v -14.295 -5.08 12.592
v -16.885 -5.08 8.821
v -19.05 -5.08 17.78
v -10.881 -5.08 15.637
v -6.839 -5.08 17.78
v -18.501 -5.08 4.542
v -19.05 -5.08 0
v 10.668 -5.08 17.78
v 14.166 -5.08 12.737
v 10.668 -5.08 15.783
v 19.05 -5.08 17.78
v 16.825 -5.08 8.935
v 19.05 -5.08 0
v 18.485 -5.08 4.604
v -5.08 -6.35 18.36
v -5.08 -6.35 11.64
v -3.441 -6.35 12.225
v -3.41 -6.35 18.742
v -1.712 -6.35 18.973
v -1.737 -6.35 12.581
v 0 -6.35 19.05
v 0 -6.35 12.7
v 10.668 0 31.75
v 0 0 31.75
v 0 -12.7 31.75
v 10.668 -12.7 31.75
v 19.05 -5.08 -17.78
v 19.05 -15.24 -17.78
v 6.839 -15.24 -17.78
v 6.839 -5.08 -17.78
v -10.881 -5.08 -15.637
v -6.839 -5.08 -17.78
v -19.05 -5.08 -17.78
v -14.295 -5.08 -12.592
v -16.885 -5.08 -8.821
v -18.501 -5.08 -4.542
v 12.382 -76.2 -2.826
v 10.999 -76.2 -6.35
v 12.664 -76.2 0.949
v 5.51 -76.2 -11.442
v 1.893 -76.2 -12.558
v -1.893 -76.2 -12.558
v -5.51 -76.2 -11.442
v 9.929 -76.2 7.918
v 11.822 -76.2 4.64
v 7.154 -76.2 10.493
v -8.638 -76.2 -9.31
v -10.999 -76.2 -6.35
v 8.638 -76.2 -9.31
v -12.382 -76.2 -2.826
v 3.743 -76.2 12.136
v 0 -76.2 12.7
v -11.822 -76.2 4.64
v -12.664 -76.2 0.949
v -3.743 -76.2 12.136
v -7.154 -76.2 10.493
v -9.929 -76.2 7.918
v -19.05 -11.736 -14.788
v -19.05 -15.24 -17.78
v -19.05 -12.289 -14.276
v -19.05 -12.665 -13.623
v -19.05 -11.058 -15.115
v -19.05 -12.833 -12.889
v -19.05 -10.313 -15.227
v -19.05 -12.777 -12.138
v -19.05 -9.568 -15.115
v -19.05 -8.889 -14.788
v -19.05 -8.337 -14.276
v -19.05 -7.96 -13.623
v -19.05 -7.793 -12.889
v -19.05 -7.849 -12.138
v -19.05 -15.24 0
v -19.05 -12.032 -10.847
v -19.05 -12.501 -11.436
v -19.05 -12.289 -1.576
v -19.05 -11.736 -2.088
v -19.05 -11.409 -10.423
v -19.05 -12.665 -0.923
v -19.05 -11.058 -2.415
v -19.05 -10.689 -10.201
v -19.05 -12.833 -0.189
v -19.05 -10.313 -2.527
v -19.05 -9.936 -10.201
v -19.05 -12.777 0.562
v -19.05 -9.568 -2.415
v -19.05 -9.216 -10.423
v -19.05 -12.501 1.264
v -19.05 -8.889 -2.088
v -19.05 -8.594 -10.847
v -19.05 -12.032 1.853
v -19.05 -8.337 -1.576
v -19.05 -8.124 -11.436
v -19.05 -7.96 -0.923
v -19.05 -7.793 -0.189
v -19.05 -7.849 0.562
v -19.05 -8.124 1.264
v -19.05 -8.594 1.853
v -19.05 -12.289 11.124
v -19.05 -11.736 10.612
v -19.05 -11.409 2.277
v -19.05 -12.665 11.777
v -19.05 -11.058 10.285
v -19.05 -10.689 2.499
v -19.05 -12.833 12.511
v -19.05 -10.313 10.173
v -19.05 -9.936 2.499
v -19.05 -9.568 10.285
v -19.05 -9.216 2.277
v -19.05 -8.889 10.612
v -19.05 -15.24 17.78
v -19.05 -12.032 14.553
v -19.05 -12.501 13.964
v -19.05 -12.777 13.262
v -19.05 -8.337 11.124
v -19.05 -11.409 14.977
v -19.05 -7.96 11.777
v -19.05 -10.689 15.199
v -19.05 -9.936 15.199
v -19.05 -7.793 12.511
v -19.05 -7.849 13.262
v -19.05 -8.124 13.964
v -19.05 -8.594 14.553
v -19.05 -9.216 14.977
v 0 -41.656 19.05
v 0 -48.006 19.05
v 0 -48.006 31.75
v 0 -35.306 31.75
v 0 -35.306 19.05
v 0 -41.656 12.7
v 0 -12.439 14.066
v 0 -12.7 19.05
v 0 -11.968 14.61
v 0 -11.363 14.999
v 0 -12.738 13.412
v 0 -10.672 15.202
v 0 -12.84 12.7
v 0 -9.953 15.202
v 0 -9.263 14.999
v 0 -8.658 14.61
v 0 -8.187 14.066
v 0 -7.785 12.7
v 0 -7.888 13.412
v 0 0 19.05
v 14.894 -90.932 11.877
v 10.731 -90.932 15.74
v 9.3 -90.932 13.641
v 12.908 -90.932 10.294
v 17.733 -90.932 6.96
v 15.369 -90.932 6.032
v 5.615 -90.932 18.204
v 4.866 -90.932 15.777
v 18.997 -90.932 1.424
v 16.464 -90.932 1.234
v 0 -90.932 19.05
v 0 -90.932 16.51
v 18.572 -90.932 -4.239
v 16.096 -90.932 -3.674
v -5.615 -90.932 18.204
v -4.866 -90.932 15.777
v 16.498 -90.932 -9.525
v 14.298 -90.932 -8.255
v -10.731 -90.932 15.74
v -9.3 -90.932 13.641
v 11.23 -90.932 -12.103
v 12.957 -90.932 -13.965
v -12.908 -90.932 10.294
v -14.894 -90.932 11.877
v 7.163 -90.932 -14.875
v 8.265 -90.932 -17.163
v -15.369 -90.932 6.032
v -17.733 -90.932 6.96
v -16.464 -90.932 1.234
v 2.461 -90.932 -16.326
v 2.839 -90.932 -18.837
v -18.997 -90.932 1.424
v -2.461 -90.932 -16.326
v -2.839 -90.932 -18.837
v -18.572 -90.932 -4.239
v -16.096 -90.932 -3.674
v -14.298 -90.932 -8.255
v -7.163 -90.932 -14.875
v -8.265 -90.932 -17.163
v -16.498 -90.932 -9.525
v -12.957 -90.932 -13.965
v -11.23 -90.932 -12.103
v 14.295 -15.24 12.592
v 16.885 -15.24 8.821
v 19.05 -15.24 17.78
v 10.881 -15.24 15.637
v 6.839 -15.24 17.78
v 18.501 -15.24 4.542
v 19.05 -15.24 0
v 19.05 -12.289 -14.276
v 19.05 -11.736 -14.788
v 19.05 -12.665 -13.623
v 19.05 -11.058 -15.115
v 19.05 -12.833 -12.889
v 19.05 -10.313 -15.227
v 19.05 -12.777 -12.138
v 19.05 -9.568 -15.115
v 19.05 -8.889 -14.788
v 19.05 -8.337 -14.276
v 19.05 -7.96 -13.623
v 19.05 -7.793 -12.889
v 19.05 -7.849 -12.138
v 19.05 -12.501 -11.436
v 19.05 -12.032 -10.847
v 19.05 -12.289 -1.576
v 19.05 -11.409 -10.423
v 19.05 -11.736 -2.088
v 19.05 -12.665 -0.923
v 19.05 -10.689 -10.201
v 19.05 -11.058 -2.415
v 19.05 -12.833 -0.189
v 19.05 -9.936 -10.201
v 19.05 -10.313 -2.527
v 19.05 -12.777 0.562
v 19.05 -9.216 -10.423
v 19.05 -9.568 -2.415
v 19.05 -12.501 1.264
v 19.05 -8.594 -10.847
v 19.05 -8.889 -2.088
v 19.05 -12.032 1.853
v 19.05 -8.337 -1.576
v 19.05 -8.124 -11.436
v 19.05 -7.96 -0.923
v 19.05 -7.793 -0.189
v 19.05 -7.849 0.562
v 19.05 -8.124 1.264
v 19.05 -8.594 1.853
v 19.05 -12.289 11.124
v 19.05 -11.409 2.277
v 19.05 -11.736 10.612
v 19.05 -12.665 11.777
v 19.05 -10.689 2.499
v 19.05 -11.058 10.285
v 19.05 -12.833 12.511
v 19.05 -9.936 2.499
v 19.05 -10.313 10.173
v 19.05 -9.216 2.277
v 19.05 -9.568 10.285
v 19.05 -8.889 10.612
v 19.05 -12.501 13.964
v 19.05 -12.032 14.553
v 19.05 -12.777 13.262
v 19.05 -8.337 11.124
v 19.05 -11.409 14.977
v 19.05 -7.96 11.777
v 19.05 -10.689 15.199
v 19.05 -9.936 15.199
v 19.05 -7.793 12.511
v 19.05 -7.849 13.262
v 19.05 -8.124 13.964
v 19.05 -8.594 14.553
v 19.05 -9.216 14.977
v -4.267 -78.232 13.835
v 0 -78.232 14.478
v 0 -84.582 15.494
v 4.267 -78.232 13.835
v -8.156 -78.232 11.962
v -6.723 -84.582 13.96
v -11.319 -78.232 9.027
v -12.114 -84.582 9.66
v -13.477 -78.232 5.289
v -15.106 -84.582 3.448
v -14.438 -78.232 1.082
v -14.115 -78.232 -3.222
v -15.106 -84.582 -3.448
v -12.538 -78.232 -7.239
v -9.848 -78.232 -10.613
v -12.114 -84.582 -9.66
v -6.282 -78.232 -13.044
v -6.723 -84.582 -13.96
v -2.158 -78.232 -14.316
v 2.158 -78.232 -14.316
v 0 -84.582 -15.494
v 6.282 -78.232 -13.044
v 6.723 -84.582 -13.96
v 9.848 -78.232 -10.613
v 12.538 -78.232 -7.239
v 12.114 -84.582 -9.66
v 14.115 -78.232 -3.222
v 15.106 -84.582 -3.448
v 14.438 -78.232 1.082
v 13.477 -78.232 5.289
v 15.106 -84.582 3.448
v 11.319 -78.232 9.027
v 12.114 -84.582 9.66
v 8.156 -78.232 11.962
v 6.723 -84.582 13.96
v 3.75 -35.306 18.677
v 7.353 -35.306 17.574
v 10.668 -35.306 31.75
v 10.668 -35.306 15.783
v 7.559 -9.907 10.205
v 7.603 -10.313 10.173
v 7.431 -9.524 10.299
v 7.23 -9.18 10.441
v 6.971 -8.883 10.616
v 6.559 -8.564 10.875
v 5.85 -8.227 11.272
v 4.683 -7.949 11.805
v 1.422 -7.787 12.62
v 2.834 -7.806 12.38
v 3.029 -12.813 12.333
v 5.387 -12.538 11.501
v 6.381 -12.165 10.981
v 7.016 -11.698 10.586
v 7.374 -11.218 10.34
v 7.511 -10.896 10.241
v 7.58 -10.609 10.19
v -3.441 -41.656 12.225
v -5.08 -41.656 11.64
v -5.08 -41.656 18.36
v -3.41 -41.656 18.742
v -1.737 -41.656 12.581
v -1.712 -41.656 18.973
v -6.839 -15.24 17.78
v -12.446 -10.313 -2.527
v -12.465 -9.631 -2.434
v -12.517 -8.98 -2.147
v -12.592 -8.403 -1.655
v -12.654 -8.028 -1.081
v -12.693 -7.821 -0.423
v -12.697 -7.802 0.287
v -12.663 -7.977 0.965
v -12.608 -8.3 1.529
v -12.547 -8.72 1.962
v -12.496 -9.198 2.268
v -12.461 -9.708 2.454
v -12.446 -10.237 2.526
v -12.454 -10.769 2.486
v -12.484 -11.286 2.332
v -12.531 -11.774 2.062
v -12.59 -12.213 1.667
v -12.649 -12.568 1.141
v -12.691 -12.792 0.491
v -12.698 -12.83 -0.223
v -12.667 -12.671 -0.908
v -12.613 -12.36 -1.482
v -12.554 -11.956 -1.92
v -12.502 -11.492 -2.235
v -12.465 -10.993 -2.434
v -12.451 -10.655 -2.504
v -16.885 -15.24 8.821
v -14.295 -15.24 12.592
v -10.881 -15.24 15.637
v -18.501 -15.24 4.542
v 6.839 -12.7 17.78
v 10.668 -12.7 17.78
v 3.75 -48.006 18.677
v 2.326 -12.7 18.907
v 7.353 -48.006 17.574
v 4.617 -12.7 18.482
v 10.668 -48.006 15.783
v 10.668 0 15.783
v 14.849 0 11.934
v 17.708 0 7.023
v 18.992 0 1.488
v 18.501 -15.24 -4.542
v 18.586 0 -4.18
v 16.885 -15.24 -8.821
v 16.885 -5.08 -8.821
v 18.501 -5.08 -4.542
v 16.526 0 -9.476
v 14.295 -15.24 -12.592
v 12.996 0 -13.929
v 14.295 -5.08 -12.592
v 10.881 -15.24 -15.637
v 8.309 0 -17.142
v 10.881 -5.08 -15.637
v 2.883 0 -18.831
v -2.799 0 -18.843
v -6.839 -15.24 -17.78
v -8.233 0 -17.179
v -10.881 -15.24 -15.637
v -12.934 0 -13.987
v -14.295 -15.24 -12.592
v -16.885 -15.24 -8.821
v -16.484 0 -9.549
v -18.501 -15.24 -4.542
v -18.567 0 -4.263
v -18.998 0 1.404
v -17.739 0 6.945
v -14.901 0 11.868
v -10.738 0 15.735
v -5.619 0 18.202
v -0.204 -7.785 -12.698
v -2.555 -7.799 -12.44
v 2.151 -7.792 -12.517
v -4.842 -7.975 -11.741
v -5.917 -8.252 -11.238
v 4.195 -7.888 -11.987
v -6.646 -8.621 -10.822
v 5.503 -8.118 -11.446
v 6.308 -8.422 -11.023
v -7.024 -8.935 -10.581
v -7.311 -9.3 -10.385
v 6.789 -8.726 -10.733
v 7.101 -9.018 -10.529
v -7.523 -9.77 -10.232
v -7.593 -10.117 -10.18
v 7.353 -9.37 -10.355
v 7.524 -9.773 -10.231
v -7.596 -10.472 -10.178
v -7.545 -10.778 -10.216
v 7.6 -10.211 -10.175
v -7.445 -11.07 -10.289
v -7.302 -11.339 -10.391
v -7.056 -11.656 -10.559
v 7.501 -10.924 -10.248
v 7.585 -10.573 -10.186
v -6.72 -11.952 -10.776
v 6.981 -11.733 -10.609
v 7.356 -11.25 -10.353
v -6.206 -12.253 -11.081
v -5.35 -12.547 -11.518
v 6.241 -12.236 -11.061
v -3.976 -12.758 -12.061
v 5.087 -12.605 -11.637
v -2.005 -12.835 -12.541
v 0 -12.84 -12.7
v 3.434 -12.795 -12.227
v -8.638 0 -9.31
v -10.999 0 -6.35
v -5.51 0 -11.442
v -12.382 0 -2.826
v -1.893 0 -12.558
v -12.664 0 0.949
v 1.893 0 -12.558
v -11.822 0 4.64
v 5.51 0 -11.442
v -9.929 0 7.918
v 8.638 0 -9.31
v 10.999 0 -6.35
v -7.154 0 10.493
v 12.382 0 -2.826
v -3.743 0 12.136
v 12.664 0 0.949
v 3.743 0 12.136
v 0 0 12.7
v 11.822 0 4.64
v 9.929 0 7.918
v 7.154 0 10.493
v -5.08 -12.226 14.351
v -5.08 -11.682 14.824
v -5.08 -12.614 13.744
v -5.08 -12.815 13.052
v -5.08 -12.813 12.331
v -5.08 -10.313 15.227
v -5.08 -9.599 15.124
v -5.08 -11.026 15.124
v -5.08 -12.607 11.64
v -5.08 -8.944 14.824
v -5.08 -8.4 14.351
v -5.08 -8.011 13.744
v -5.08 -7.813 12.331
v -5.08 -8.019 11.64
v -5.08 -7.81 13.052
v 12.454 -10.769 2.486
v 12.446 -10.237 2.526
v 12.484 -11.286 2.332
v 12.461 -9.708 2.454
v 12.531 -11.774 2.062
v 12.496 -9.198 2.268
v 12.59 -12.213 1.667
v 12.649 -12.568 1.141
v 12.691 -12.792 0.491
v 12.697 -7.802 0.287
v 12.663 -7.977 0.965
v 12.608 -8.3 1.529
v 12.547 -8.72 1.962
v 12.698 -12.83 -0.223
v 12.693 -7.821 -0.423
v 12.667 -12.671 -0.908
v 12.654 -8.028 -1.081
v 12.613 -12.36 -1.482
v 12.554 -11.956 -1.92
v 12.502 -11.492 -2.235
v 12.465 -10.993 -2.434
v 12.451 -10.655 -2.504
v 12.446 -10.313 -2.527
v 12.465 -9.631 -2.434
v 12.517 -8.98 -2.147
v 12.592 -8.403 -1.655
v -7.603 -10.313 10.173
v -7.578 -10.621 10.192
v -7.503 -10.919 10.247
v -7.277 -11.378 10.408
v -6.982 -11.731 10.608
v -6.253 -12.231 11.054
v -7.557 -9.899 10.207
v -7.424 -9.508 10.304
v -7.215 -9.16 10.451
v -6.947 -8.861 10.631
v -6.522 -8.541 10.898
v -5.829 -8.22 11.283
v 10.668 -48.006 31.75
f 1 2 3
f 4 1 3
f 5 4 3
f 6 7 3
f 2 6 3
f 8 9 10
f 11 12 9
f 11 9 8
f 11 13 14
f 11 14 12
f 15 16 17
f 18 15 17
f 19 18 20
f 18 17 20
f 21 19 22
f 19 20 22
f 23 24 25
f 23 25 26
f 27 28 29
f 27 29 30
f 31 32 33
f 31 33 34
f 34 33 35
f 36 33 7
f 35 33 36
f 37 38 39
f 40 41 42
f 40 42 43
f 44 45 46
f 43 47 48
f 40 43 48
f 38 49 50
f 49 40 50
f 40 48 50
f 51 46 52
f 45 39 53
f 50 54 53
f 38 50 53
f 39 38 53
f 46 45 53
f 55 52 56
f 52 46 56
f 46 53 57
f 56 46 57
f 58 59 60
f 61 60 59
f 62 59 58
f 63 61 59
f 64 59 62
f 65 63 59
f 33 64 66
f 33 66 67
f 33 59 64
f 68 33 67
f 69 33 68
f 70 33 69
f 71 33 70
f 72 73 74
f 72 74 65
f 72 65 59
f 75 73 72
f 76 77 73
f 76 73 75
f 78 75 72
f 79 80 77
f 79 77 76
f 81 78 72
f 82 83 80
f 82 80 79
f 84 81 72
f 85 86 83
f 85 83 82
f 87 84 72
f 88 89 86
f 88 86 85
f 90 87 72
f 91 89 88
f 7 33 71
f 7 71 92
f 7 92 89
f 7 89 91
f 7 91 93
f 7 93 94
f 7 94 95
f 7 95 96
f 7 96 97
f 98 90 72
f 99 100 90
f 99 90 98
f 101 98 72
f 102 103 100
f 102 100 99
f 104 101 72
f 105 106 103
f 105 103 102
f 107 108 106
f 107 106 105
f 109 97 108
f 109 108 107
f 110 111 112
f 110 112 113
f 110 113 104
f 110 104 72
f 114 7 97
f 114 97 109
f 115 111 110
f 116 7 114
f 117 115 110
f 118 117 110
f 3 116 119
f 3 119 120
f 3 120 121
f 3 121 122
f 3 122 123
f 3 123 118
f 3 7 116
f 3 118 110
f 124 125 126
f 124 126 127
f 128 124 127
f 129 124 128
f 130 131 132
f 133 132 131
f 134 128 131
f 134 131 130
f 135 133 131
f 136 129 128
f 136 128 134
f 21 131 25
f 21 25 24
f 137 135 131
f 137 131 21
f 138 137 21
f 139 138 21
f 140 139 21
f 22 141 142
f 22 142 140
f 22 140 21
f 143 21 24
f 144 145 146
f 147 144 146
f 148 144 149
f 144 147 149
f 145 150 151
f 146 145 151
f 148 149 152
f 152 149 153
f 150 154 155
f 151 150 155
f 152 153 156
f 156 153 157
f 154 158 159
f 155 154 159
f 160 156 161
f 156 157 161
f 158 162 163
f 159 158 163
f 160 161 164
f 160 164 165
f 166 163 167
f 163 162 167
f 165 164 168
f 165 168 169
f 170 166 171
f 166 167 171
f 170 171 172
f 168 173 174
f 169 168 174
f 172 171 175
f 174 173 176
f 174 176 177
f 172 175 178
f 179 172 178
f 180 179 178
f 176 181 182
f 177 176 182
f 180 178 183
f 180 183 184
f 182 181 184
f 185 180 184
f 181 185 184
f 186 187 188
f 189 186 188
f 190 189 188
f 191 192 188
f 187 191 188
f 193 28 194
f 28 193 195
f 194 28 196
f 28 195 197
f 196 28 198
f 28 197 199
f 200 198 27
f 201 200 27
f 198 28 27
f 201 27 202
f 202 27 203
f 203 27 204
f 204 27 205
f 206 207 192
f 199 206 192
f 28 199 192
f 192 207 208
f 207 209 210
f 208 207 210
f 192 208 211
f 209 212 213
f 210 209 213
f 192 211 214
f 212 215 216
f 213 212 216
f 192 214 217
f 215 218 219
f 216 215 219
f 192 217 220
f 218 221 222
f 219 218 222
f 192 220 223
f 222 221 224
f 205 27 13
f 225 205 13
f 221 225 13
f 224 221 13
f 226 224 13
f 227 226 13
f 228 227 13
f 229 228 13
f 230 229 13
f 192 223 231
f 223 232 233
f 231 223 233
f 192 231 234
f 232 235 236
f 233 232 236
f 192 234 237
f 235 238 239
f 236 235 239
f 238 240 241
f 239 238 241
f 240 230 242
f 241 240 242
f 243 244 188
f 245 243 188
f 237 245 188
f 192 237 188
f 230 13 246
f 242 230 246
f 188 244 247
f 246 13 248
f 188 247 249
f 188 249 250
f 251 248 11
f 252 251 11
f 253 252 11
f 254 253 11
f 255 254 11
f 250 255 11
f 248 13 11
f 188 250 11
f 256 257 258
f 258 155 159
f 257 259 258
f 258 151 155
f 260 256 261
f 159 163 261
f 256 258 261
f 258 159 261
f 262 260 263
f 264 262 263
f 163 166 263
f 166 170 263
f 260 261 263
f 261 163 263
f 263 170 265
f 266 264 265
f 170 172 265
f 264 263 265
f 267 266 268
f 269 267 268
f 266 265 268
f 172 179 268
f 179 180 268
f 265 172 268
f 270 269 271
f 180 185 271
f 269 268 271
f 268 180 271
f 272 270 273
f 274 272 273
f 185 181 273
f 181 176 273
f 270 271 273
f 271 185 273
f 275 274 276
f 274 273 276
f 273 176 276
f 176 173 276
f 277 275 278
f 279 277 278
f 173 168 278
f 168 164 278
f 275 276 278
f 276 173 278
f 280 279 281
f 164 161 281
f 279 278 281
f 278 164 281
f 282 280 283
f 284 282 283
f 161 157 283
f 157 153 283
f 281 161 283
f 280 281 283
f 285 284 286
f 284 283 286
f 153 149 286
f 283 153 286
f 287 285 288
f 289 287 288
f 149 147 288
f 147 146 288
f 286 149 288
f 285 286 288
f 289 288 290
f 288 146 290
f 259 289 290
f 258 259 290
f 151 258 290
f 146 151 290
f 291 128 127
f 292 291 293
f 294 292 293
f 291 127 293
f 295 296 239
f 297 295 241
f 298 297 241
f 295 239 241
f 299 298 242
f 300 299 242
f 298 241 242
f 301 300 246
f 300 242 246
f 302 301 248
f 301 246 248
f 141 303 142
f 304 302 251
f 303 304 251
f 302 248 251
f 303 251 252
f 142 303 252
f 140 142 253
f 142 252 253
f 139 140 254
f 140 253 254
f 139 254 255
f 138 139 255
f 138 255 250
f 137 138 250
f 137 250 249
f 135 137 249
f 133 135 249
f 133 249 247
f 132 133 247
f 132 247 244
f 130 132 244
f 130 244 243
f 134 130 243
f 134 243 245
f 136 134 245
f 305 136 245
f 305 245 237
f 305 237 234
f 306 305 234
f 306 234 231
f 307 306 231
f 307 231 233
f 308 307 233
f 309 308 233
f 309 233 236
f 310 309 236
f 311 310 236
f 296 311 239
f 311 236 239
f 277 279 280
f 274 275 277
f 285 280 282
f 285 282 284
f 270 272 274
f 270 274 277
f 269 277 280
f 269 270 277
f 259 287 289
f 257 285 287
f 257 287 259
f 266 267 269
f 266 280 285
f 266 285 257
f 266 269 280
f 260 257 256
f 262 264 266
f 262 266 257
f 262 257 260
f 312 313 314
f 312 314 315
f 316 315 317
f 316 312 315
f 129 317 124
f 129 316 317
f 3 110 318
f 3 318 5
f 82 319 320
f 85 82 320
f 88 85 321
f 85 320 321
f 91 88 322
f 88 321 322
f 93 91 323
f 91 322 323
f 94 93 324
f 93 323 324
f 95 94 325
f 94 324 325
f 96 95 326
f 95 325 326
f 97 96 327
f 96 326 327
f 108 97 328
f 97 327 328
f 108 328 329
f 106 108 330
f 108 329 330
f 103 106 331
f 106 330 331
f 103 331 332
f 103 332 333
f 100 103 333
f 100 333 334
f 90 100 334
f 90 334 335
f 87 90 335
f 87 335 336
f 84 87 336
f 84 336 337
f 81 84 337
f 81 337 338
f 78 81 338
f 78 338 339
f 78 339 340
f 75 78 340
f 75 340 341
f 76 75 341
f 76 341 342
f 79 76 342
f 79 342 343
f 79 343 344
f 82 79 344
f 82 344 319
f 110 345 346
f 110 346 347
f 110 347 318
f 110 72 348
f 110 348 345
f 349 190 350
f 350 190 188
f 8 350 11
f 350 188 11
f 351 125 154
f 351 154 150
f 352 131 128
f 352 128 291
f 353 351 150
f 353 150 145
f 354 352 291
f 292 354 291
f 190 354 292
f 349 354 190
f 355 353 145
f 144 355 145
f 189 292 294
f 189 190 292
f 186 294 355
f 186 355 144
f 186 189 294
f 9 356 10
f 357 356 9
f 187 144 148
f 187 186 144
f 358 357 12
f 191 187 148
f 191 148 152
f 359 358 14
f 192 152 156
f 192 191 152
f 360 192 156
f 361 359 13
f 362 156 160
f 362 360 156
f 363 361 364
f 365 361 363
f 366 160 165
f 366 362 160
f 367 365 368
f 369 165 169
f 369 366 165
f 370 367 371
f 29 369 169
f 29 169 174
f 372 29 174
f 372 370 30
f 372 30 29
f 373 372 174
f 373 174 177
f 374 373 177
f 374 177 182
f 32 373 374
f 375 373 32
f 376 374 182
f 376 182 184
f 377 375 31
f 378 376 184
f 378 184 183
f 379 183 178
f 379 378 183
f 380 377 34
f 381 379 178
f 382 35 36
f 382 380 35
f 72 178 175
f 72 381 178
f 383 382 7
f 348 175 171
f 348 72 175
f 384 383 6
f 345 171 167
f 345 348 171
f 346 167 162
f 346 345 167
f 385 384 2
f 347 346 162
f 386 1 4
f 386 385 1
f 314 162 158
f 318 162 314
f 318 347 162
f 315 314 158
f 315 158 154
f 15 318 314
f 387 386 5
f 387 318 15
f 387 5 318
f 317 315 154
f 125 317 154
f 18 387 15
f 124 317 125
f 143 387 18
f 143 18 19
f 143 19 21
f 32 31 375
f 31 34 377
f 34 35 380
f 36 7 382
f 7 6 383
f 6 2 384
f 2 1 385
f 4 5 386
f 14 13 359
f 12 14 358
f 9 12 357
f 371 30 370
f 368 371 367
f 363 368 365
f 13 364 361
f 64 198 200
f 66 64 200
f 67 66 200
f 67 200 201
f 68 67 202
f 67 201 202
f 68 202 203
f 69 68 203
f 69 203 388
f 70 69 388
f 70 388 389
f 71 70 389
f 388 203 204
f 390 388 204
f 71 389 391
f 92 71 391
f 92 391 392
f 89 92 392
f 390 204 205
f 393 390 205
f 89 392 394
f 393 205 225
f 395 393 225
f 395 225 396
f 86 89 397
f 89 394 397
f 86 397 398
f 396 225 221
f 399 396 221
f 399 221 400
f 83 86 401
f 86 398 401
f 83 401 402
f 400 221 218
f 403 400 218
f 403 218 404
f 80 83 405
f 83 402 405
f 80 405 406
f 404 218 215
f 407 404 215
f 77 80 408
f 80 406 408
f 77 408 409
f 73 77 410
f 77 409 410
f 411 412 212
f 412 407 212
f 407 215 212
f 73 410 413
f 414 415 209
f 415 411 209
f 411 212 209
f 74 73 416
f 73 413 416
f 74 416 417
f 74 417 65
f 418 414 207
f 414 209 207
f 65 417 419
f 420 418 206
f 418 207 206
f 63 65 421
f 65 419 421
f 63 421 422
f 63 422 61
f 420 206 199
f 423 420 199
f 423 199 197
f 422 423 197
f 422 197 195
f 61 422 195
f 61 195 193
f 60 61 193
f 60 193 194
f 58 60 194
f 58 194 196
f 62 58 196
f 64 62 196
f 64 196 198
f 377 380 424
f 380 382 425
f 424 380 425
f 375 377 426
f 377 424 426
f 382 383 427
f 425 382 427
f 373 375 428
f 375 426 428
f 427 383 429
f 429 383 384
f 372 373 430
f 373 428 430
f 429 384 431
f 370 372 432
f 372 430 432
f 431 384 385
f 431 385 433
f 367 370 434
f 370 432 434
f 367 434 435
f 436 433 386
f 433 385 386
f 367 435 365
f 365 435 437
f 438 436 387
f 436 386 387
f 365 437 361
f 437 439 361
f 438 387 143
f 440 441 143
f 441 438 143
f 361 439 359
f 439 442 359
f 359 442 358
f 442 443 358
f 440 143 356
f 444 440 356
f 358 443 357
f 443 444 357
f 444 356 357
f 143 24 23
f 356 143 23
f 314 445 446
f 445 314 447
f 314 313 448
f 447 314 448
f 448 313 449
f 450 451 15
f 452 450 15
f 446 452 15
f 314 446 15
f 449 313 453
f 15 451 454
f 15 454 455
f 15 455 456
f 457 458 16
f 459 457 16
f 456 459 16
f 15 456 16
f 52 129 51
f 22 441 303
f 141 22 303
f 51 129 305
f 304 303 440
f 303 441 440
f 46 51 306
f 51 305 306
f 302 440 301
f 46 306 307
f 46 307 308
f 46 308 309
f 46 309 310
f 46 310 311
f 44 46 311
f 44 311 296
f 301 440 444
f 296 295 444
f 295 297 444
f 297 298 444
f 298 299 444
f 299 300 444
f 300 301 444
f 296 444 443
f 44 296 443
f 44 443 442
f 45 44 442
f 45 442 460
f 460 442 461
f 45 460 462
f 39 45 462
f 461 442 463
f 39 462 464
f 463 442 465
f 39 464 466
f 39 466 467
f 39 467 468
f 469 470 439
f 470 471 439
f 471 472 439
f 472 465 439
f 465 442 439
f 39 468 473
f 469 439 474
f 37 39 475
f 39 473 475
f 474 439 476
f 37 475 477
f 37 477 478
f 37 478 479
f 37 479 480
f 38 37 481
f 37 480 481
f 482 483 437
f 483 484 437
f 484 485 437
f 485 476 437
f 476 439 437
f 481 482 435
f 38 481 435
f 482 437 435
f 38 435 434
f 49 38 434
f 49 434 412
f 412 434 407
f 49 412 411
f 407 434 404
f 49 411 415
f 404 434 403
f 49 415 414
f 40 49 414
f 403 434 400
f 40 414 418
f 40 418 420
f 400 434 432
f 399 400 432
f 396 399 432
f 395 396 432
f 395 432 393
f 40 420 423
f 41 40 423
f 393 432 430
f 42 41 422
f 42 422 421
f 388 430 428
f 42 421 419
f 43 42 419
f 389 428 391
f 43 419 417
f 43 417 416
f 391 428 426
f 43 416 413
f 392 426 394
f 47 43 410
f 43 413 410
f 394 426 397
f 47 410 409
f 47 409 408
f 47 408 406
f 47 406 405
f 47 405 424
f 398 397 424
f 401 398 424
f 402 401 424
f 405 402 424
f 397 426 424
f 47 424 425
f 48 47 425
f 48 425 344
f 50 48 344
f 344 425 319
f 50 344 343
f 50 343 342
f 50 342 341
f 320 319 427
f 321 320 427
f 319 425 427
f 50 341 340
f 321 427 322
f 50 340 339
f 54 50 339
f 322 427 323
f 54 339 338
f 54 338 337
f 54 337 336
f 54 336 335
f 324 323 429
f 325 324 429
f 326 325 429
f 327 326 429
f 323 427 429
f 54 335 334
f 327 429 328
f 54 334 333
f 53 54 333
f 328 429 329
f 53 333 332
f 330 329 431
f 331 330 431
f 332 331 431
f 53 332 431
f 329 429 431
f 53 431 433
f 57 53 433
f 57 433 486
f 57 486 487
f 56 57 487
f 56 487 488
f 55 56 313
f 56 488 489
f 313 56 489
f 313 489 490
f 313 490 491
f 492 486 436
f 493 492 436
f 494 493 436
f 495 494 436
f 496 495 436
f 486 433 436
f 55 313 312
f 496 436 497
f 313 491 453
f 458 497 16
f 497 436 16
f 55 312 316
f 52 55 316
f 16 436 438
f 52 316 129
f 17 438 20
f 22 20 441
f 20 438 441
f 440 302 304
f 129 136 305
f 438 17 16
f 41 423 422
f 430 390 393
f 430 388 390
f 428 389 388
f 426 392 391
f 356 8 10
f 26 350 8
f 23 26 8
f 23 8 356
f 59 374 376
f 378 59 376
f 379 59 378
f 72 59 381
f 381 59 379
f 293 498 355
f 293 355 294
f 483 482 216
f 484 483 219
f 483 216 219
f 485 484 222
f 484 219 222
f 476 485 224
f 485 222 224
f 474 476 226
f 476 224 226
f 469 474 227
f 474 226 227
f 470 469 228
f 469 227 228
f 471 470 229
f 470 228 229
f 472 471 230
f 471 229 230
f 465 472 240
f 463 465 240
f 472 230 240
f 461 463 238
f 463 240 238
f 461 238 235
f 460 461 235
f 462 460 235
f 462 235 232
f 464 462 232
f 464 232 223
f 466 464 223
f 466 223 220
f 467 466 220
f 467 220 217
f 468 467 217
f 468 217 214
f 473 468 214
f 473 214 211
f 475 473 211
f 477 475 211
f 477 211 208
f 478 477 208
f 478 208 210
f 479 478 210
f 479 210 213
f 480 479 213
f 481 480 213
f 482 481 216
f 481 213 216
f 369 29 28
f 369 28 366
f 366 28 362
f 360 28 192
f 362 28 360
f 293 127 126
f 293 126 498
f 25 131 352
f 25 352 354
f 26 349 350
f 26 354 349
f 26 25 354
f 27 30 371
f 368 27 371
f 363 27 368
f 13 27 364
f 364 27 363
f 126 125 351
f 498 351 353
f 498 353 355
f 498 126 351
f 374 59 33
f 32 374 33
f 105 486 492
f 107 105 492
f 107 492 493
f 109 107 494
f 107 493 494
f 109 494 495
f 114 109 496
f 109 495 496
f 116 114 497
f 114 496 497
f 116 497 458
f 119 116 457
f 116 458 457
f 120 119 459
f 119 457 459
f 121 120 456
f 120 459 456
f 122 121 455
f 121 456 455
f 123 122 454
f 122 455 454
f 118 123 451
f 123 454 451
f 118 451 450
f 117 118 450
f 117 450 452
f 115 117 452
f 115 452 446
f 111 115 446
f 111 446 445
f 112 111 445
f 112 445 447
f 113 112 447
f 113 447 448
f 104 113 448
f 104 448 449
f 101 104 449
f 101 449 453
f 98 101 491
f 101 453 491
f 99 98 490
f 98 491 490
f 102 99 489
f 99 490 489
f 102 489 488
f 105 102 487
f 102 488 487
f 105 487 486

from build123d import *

# Parameters (mm, degrees)
SKETCH1_R                            = 19.05
SKETCH1_R_2                          = 12.7
BOSS_EXTRUDE1_DEPTH                  = 76.2
SKETCH2_W                            = 10.668
SKETCH2_H                            = 12.7
BOSS_EXTRUDE2_DEPTH                  = 12.7
BOSS_EXTRUDE2_DIRECTION_2_REACH      = 89.298
BOSS_EXTRUDE2_DIRECTION_2_END_RADIUS = 19.05
SKETCH3_R                            = 19.05
BOSS_EXTRUDE3_DEPTH                  = 2.032
SKETCH4_W                            = 5.08
SKETCH4_H                            = 35.306
CUT_EXTRUDE1_DEPTH                   = 87.551781172
BOSS_EXTRUDE4_REACH                  = 105.578
BOSS_EXTRUDE4_END_RADIUS             = 19.05
SKETCH7_W                            = 35.56
SKETCH7_H                            = 10.16
F_8_0_199_DIAMETER_HOLE1_D           = 5.0546


with BuildPart() as part:
    # Sketch1 → Boss-Extrude1 (new body)
    with BuildSketch(Plane(origin=(0, 0, 0), x_dir=(1, 0, 0), z_dir=(0, 1, 0))):
        with Locations(Location((0, 0, 0), (0, 0, 270))):
            Circle(SKETCH1_R)
        with Locations(Location((0, 0, 0), (0, 0, 270))):
            Circle(SKETCH1_R_2, mode=Mode.SUBTRACT)
    extrude(amount=-BOSS_EXTRUDE1_DEPTH)

    # Sketch2 → Boss-Extrude2 (add)
    with BuildSketch(Plane.XY.offset(19.05)):
        with Locations((5.334, -6.35)):
            Rectangle(SKETCH2_W, SKETCH2_H)
        with Locations((5.334, -41.656)):
            Rectangle(SKETCH2_W, SKETCH2_H)
    extrude(amount=BOSS_EXTRUDE2_DEPTH)

    # Boss-Extrude2 direction 2: up to this cylinder (the profile starts outside it)
    boss_extrude2_direction_2_end = Plane(origin=(0, -24.003, 0), z_dir=(0, 1, 0)) * Cylinder(BOSS_EXTRUDE2_DIRECTION_2_END_RADIUS, 253.002, mode=Mode.PRIVATE)
    # Sketch2 → Boss-Extrude2 direction 2 (add, up to the surface)
    with BuildSketch(Plane.XY.offset(19.05), mode=Mode.PRIVATE) as boss_extrude2_direction_2_sk1:
        with Locations((5.334, -6.35)):
            Rectangle(SKETCH2_W, SKETCH2_H)
    boss_extrude2_direction_2_tool1 = extrude(boss_extrude2_direction_2_sk1.sketch, amount=-BOSS_EXTRUDE2_DIRECTION_2_REACH, mode=Mode.PRIVATE) - boss_extrude2_direction_2_end
    add(boss_extrude2_direction_2_tool1.solids().sort_by_distance((5.334, -6.35, 19.05))[0])
    # Sketch2 → Boss-Extrude2 direction 2 (add, up to the surface)
    with BuildSketch(Plane.XY.offset(19.05), mode=Mode.PRIVATE) as boss_extrude2_direction_2_sk2:
        with Locations((5.334, -41.656)):
            Rectangle(SKETCH2_W, SKETCH2_H)
    boss_extrude2_direction_2_tool2 = extrude(boss_extrude2_direction_2_sk2.sketch, amount=-BOSS_EXTRUDE2_DIRECTION_2_REACH, mode=Mode.PRIVATE) - boss_extrude2_direction_2_end
    add(boss_extrude2_direction_2_tool2.solids().sort_by_distance((5.334, -41.656, 19.05))[0])

    # Sketch3 → Boss-Extrude3 (add)
    with BuildSketch(Plane.XZ.offset(76.2)):
        with Locations(Location((0, 0, 0), (0, 0, 90))):
            Circle(SKETCH3_R)
    extrude(amount=BOSS_EXTRUDE3_DEPTH)

    # Sketch4 → Cut-Extrude1 (cut, through all)
    with BuildSketch(Plane.XY):
        with Locations((-2.54, -24.003)):
            Rectangle(SKETCH4_W, SKETCH4_H)
    extrude(amount=CUT_EXTRUDE1_DEPTH, mode=Mode.SUBTRACT)

    # Sketch6 → Revolve2 (revolve)
    with BuildSketch(Plane.XY, mode=Mode.PRIVATE) as revolve2_sk:
        Polygon((-14.478, -78.232), (-16.51, -90.932), (-19.05, -90.932), (-19.05, -78.232), align=None)
    revolve(revolve2_sk.sketch.rotate(Axis((0, -78.232, 0), (0, -1, 0)), 270), axis=Axis((0, -78.232, 0), (0, -1, 0)))

    # Boss-Extrude4: up to this cylinder (the profile starts outside it)
    boss_extrude4_end = Plane(origin=(0, -10.16, 0), z_dir=(0, 1, 0)) * Cylinder(BOSS_EXTRUDE4_END_RADIUS, 250.256, mode=Mode.PRIVATE)
    # Sketch7 → Boss-Extrude4 (add, up to the surface)
    with BuildSketch(Plane.ZY.offset(19.05), mode=Mode.PRIVATE) as boss_extrude4_sk1:
        with Locations((0, -10.16)):
            Rectangle(SKETCH7_W, SKETCH7_H)
    boss_extrude4_tool1 = extrude(boss_extrude4_sk1.sketch, amount=-BOSS_EXTRUDE4_REACH, mode=Mode.PRIVATE) - boss_extrude4_end
    boss_extrude4 = boss_extrude4_tool1.solids().sort_by_distance((-19.05, -10.16, 0))[0] + boss_extrude4_tool1.solids().sort_by_distance((-19.05, -10.16, 0))[1]
    add(boss_extrude4)

    # Mirror1: Boss-Extrude4 across plane
    add(boss_extrude4.mirror(Plane(origin=(0, 0, 0), x_dir=(0, 0, 1), z_dir=(1, 0, 0))))

    # #8 (0.199) Diameter Hole1 (through all)
    with Locations(Plane.ZY.offset(19.05)):
        with Locations((0, -10.312752813), (12.7, -10.312752813), (-12.7, -10.312752813)):
            Hole(F_8_0_199_DIAMETER_HOLE1_D / 2)


solid = part.part
